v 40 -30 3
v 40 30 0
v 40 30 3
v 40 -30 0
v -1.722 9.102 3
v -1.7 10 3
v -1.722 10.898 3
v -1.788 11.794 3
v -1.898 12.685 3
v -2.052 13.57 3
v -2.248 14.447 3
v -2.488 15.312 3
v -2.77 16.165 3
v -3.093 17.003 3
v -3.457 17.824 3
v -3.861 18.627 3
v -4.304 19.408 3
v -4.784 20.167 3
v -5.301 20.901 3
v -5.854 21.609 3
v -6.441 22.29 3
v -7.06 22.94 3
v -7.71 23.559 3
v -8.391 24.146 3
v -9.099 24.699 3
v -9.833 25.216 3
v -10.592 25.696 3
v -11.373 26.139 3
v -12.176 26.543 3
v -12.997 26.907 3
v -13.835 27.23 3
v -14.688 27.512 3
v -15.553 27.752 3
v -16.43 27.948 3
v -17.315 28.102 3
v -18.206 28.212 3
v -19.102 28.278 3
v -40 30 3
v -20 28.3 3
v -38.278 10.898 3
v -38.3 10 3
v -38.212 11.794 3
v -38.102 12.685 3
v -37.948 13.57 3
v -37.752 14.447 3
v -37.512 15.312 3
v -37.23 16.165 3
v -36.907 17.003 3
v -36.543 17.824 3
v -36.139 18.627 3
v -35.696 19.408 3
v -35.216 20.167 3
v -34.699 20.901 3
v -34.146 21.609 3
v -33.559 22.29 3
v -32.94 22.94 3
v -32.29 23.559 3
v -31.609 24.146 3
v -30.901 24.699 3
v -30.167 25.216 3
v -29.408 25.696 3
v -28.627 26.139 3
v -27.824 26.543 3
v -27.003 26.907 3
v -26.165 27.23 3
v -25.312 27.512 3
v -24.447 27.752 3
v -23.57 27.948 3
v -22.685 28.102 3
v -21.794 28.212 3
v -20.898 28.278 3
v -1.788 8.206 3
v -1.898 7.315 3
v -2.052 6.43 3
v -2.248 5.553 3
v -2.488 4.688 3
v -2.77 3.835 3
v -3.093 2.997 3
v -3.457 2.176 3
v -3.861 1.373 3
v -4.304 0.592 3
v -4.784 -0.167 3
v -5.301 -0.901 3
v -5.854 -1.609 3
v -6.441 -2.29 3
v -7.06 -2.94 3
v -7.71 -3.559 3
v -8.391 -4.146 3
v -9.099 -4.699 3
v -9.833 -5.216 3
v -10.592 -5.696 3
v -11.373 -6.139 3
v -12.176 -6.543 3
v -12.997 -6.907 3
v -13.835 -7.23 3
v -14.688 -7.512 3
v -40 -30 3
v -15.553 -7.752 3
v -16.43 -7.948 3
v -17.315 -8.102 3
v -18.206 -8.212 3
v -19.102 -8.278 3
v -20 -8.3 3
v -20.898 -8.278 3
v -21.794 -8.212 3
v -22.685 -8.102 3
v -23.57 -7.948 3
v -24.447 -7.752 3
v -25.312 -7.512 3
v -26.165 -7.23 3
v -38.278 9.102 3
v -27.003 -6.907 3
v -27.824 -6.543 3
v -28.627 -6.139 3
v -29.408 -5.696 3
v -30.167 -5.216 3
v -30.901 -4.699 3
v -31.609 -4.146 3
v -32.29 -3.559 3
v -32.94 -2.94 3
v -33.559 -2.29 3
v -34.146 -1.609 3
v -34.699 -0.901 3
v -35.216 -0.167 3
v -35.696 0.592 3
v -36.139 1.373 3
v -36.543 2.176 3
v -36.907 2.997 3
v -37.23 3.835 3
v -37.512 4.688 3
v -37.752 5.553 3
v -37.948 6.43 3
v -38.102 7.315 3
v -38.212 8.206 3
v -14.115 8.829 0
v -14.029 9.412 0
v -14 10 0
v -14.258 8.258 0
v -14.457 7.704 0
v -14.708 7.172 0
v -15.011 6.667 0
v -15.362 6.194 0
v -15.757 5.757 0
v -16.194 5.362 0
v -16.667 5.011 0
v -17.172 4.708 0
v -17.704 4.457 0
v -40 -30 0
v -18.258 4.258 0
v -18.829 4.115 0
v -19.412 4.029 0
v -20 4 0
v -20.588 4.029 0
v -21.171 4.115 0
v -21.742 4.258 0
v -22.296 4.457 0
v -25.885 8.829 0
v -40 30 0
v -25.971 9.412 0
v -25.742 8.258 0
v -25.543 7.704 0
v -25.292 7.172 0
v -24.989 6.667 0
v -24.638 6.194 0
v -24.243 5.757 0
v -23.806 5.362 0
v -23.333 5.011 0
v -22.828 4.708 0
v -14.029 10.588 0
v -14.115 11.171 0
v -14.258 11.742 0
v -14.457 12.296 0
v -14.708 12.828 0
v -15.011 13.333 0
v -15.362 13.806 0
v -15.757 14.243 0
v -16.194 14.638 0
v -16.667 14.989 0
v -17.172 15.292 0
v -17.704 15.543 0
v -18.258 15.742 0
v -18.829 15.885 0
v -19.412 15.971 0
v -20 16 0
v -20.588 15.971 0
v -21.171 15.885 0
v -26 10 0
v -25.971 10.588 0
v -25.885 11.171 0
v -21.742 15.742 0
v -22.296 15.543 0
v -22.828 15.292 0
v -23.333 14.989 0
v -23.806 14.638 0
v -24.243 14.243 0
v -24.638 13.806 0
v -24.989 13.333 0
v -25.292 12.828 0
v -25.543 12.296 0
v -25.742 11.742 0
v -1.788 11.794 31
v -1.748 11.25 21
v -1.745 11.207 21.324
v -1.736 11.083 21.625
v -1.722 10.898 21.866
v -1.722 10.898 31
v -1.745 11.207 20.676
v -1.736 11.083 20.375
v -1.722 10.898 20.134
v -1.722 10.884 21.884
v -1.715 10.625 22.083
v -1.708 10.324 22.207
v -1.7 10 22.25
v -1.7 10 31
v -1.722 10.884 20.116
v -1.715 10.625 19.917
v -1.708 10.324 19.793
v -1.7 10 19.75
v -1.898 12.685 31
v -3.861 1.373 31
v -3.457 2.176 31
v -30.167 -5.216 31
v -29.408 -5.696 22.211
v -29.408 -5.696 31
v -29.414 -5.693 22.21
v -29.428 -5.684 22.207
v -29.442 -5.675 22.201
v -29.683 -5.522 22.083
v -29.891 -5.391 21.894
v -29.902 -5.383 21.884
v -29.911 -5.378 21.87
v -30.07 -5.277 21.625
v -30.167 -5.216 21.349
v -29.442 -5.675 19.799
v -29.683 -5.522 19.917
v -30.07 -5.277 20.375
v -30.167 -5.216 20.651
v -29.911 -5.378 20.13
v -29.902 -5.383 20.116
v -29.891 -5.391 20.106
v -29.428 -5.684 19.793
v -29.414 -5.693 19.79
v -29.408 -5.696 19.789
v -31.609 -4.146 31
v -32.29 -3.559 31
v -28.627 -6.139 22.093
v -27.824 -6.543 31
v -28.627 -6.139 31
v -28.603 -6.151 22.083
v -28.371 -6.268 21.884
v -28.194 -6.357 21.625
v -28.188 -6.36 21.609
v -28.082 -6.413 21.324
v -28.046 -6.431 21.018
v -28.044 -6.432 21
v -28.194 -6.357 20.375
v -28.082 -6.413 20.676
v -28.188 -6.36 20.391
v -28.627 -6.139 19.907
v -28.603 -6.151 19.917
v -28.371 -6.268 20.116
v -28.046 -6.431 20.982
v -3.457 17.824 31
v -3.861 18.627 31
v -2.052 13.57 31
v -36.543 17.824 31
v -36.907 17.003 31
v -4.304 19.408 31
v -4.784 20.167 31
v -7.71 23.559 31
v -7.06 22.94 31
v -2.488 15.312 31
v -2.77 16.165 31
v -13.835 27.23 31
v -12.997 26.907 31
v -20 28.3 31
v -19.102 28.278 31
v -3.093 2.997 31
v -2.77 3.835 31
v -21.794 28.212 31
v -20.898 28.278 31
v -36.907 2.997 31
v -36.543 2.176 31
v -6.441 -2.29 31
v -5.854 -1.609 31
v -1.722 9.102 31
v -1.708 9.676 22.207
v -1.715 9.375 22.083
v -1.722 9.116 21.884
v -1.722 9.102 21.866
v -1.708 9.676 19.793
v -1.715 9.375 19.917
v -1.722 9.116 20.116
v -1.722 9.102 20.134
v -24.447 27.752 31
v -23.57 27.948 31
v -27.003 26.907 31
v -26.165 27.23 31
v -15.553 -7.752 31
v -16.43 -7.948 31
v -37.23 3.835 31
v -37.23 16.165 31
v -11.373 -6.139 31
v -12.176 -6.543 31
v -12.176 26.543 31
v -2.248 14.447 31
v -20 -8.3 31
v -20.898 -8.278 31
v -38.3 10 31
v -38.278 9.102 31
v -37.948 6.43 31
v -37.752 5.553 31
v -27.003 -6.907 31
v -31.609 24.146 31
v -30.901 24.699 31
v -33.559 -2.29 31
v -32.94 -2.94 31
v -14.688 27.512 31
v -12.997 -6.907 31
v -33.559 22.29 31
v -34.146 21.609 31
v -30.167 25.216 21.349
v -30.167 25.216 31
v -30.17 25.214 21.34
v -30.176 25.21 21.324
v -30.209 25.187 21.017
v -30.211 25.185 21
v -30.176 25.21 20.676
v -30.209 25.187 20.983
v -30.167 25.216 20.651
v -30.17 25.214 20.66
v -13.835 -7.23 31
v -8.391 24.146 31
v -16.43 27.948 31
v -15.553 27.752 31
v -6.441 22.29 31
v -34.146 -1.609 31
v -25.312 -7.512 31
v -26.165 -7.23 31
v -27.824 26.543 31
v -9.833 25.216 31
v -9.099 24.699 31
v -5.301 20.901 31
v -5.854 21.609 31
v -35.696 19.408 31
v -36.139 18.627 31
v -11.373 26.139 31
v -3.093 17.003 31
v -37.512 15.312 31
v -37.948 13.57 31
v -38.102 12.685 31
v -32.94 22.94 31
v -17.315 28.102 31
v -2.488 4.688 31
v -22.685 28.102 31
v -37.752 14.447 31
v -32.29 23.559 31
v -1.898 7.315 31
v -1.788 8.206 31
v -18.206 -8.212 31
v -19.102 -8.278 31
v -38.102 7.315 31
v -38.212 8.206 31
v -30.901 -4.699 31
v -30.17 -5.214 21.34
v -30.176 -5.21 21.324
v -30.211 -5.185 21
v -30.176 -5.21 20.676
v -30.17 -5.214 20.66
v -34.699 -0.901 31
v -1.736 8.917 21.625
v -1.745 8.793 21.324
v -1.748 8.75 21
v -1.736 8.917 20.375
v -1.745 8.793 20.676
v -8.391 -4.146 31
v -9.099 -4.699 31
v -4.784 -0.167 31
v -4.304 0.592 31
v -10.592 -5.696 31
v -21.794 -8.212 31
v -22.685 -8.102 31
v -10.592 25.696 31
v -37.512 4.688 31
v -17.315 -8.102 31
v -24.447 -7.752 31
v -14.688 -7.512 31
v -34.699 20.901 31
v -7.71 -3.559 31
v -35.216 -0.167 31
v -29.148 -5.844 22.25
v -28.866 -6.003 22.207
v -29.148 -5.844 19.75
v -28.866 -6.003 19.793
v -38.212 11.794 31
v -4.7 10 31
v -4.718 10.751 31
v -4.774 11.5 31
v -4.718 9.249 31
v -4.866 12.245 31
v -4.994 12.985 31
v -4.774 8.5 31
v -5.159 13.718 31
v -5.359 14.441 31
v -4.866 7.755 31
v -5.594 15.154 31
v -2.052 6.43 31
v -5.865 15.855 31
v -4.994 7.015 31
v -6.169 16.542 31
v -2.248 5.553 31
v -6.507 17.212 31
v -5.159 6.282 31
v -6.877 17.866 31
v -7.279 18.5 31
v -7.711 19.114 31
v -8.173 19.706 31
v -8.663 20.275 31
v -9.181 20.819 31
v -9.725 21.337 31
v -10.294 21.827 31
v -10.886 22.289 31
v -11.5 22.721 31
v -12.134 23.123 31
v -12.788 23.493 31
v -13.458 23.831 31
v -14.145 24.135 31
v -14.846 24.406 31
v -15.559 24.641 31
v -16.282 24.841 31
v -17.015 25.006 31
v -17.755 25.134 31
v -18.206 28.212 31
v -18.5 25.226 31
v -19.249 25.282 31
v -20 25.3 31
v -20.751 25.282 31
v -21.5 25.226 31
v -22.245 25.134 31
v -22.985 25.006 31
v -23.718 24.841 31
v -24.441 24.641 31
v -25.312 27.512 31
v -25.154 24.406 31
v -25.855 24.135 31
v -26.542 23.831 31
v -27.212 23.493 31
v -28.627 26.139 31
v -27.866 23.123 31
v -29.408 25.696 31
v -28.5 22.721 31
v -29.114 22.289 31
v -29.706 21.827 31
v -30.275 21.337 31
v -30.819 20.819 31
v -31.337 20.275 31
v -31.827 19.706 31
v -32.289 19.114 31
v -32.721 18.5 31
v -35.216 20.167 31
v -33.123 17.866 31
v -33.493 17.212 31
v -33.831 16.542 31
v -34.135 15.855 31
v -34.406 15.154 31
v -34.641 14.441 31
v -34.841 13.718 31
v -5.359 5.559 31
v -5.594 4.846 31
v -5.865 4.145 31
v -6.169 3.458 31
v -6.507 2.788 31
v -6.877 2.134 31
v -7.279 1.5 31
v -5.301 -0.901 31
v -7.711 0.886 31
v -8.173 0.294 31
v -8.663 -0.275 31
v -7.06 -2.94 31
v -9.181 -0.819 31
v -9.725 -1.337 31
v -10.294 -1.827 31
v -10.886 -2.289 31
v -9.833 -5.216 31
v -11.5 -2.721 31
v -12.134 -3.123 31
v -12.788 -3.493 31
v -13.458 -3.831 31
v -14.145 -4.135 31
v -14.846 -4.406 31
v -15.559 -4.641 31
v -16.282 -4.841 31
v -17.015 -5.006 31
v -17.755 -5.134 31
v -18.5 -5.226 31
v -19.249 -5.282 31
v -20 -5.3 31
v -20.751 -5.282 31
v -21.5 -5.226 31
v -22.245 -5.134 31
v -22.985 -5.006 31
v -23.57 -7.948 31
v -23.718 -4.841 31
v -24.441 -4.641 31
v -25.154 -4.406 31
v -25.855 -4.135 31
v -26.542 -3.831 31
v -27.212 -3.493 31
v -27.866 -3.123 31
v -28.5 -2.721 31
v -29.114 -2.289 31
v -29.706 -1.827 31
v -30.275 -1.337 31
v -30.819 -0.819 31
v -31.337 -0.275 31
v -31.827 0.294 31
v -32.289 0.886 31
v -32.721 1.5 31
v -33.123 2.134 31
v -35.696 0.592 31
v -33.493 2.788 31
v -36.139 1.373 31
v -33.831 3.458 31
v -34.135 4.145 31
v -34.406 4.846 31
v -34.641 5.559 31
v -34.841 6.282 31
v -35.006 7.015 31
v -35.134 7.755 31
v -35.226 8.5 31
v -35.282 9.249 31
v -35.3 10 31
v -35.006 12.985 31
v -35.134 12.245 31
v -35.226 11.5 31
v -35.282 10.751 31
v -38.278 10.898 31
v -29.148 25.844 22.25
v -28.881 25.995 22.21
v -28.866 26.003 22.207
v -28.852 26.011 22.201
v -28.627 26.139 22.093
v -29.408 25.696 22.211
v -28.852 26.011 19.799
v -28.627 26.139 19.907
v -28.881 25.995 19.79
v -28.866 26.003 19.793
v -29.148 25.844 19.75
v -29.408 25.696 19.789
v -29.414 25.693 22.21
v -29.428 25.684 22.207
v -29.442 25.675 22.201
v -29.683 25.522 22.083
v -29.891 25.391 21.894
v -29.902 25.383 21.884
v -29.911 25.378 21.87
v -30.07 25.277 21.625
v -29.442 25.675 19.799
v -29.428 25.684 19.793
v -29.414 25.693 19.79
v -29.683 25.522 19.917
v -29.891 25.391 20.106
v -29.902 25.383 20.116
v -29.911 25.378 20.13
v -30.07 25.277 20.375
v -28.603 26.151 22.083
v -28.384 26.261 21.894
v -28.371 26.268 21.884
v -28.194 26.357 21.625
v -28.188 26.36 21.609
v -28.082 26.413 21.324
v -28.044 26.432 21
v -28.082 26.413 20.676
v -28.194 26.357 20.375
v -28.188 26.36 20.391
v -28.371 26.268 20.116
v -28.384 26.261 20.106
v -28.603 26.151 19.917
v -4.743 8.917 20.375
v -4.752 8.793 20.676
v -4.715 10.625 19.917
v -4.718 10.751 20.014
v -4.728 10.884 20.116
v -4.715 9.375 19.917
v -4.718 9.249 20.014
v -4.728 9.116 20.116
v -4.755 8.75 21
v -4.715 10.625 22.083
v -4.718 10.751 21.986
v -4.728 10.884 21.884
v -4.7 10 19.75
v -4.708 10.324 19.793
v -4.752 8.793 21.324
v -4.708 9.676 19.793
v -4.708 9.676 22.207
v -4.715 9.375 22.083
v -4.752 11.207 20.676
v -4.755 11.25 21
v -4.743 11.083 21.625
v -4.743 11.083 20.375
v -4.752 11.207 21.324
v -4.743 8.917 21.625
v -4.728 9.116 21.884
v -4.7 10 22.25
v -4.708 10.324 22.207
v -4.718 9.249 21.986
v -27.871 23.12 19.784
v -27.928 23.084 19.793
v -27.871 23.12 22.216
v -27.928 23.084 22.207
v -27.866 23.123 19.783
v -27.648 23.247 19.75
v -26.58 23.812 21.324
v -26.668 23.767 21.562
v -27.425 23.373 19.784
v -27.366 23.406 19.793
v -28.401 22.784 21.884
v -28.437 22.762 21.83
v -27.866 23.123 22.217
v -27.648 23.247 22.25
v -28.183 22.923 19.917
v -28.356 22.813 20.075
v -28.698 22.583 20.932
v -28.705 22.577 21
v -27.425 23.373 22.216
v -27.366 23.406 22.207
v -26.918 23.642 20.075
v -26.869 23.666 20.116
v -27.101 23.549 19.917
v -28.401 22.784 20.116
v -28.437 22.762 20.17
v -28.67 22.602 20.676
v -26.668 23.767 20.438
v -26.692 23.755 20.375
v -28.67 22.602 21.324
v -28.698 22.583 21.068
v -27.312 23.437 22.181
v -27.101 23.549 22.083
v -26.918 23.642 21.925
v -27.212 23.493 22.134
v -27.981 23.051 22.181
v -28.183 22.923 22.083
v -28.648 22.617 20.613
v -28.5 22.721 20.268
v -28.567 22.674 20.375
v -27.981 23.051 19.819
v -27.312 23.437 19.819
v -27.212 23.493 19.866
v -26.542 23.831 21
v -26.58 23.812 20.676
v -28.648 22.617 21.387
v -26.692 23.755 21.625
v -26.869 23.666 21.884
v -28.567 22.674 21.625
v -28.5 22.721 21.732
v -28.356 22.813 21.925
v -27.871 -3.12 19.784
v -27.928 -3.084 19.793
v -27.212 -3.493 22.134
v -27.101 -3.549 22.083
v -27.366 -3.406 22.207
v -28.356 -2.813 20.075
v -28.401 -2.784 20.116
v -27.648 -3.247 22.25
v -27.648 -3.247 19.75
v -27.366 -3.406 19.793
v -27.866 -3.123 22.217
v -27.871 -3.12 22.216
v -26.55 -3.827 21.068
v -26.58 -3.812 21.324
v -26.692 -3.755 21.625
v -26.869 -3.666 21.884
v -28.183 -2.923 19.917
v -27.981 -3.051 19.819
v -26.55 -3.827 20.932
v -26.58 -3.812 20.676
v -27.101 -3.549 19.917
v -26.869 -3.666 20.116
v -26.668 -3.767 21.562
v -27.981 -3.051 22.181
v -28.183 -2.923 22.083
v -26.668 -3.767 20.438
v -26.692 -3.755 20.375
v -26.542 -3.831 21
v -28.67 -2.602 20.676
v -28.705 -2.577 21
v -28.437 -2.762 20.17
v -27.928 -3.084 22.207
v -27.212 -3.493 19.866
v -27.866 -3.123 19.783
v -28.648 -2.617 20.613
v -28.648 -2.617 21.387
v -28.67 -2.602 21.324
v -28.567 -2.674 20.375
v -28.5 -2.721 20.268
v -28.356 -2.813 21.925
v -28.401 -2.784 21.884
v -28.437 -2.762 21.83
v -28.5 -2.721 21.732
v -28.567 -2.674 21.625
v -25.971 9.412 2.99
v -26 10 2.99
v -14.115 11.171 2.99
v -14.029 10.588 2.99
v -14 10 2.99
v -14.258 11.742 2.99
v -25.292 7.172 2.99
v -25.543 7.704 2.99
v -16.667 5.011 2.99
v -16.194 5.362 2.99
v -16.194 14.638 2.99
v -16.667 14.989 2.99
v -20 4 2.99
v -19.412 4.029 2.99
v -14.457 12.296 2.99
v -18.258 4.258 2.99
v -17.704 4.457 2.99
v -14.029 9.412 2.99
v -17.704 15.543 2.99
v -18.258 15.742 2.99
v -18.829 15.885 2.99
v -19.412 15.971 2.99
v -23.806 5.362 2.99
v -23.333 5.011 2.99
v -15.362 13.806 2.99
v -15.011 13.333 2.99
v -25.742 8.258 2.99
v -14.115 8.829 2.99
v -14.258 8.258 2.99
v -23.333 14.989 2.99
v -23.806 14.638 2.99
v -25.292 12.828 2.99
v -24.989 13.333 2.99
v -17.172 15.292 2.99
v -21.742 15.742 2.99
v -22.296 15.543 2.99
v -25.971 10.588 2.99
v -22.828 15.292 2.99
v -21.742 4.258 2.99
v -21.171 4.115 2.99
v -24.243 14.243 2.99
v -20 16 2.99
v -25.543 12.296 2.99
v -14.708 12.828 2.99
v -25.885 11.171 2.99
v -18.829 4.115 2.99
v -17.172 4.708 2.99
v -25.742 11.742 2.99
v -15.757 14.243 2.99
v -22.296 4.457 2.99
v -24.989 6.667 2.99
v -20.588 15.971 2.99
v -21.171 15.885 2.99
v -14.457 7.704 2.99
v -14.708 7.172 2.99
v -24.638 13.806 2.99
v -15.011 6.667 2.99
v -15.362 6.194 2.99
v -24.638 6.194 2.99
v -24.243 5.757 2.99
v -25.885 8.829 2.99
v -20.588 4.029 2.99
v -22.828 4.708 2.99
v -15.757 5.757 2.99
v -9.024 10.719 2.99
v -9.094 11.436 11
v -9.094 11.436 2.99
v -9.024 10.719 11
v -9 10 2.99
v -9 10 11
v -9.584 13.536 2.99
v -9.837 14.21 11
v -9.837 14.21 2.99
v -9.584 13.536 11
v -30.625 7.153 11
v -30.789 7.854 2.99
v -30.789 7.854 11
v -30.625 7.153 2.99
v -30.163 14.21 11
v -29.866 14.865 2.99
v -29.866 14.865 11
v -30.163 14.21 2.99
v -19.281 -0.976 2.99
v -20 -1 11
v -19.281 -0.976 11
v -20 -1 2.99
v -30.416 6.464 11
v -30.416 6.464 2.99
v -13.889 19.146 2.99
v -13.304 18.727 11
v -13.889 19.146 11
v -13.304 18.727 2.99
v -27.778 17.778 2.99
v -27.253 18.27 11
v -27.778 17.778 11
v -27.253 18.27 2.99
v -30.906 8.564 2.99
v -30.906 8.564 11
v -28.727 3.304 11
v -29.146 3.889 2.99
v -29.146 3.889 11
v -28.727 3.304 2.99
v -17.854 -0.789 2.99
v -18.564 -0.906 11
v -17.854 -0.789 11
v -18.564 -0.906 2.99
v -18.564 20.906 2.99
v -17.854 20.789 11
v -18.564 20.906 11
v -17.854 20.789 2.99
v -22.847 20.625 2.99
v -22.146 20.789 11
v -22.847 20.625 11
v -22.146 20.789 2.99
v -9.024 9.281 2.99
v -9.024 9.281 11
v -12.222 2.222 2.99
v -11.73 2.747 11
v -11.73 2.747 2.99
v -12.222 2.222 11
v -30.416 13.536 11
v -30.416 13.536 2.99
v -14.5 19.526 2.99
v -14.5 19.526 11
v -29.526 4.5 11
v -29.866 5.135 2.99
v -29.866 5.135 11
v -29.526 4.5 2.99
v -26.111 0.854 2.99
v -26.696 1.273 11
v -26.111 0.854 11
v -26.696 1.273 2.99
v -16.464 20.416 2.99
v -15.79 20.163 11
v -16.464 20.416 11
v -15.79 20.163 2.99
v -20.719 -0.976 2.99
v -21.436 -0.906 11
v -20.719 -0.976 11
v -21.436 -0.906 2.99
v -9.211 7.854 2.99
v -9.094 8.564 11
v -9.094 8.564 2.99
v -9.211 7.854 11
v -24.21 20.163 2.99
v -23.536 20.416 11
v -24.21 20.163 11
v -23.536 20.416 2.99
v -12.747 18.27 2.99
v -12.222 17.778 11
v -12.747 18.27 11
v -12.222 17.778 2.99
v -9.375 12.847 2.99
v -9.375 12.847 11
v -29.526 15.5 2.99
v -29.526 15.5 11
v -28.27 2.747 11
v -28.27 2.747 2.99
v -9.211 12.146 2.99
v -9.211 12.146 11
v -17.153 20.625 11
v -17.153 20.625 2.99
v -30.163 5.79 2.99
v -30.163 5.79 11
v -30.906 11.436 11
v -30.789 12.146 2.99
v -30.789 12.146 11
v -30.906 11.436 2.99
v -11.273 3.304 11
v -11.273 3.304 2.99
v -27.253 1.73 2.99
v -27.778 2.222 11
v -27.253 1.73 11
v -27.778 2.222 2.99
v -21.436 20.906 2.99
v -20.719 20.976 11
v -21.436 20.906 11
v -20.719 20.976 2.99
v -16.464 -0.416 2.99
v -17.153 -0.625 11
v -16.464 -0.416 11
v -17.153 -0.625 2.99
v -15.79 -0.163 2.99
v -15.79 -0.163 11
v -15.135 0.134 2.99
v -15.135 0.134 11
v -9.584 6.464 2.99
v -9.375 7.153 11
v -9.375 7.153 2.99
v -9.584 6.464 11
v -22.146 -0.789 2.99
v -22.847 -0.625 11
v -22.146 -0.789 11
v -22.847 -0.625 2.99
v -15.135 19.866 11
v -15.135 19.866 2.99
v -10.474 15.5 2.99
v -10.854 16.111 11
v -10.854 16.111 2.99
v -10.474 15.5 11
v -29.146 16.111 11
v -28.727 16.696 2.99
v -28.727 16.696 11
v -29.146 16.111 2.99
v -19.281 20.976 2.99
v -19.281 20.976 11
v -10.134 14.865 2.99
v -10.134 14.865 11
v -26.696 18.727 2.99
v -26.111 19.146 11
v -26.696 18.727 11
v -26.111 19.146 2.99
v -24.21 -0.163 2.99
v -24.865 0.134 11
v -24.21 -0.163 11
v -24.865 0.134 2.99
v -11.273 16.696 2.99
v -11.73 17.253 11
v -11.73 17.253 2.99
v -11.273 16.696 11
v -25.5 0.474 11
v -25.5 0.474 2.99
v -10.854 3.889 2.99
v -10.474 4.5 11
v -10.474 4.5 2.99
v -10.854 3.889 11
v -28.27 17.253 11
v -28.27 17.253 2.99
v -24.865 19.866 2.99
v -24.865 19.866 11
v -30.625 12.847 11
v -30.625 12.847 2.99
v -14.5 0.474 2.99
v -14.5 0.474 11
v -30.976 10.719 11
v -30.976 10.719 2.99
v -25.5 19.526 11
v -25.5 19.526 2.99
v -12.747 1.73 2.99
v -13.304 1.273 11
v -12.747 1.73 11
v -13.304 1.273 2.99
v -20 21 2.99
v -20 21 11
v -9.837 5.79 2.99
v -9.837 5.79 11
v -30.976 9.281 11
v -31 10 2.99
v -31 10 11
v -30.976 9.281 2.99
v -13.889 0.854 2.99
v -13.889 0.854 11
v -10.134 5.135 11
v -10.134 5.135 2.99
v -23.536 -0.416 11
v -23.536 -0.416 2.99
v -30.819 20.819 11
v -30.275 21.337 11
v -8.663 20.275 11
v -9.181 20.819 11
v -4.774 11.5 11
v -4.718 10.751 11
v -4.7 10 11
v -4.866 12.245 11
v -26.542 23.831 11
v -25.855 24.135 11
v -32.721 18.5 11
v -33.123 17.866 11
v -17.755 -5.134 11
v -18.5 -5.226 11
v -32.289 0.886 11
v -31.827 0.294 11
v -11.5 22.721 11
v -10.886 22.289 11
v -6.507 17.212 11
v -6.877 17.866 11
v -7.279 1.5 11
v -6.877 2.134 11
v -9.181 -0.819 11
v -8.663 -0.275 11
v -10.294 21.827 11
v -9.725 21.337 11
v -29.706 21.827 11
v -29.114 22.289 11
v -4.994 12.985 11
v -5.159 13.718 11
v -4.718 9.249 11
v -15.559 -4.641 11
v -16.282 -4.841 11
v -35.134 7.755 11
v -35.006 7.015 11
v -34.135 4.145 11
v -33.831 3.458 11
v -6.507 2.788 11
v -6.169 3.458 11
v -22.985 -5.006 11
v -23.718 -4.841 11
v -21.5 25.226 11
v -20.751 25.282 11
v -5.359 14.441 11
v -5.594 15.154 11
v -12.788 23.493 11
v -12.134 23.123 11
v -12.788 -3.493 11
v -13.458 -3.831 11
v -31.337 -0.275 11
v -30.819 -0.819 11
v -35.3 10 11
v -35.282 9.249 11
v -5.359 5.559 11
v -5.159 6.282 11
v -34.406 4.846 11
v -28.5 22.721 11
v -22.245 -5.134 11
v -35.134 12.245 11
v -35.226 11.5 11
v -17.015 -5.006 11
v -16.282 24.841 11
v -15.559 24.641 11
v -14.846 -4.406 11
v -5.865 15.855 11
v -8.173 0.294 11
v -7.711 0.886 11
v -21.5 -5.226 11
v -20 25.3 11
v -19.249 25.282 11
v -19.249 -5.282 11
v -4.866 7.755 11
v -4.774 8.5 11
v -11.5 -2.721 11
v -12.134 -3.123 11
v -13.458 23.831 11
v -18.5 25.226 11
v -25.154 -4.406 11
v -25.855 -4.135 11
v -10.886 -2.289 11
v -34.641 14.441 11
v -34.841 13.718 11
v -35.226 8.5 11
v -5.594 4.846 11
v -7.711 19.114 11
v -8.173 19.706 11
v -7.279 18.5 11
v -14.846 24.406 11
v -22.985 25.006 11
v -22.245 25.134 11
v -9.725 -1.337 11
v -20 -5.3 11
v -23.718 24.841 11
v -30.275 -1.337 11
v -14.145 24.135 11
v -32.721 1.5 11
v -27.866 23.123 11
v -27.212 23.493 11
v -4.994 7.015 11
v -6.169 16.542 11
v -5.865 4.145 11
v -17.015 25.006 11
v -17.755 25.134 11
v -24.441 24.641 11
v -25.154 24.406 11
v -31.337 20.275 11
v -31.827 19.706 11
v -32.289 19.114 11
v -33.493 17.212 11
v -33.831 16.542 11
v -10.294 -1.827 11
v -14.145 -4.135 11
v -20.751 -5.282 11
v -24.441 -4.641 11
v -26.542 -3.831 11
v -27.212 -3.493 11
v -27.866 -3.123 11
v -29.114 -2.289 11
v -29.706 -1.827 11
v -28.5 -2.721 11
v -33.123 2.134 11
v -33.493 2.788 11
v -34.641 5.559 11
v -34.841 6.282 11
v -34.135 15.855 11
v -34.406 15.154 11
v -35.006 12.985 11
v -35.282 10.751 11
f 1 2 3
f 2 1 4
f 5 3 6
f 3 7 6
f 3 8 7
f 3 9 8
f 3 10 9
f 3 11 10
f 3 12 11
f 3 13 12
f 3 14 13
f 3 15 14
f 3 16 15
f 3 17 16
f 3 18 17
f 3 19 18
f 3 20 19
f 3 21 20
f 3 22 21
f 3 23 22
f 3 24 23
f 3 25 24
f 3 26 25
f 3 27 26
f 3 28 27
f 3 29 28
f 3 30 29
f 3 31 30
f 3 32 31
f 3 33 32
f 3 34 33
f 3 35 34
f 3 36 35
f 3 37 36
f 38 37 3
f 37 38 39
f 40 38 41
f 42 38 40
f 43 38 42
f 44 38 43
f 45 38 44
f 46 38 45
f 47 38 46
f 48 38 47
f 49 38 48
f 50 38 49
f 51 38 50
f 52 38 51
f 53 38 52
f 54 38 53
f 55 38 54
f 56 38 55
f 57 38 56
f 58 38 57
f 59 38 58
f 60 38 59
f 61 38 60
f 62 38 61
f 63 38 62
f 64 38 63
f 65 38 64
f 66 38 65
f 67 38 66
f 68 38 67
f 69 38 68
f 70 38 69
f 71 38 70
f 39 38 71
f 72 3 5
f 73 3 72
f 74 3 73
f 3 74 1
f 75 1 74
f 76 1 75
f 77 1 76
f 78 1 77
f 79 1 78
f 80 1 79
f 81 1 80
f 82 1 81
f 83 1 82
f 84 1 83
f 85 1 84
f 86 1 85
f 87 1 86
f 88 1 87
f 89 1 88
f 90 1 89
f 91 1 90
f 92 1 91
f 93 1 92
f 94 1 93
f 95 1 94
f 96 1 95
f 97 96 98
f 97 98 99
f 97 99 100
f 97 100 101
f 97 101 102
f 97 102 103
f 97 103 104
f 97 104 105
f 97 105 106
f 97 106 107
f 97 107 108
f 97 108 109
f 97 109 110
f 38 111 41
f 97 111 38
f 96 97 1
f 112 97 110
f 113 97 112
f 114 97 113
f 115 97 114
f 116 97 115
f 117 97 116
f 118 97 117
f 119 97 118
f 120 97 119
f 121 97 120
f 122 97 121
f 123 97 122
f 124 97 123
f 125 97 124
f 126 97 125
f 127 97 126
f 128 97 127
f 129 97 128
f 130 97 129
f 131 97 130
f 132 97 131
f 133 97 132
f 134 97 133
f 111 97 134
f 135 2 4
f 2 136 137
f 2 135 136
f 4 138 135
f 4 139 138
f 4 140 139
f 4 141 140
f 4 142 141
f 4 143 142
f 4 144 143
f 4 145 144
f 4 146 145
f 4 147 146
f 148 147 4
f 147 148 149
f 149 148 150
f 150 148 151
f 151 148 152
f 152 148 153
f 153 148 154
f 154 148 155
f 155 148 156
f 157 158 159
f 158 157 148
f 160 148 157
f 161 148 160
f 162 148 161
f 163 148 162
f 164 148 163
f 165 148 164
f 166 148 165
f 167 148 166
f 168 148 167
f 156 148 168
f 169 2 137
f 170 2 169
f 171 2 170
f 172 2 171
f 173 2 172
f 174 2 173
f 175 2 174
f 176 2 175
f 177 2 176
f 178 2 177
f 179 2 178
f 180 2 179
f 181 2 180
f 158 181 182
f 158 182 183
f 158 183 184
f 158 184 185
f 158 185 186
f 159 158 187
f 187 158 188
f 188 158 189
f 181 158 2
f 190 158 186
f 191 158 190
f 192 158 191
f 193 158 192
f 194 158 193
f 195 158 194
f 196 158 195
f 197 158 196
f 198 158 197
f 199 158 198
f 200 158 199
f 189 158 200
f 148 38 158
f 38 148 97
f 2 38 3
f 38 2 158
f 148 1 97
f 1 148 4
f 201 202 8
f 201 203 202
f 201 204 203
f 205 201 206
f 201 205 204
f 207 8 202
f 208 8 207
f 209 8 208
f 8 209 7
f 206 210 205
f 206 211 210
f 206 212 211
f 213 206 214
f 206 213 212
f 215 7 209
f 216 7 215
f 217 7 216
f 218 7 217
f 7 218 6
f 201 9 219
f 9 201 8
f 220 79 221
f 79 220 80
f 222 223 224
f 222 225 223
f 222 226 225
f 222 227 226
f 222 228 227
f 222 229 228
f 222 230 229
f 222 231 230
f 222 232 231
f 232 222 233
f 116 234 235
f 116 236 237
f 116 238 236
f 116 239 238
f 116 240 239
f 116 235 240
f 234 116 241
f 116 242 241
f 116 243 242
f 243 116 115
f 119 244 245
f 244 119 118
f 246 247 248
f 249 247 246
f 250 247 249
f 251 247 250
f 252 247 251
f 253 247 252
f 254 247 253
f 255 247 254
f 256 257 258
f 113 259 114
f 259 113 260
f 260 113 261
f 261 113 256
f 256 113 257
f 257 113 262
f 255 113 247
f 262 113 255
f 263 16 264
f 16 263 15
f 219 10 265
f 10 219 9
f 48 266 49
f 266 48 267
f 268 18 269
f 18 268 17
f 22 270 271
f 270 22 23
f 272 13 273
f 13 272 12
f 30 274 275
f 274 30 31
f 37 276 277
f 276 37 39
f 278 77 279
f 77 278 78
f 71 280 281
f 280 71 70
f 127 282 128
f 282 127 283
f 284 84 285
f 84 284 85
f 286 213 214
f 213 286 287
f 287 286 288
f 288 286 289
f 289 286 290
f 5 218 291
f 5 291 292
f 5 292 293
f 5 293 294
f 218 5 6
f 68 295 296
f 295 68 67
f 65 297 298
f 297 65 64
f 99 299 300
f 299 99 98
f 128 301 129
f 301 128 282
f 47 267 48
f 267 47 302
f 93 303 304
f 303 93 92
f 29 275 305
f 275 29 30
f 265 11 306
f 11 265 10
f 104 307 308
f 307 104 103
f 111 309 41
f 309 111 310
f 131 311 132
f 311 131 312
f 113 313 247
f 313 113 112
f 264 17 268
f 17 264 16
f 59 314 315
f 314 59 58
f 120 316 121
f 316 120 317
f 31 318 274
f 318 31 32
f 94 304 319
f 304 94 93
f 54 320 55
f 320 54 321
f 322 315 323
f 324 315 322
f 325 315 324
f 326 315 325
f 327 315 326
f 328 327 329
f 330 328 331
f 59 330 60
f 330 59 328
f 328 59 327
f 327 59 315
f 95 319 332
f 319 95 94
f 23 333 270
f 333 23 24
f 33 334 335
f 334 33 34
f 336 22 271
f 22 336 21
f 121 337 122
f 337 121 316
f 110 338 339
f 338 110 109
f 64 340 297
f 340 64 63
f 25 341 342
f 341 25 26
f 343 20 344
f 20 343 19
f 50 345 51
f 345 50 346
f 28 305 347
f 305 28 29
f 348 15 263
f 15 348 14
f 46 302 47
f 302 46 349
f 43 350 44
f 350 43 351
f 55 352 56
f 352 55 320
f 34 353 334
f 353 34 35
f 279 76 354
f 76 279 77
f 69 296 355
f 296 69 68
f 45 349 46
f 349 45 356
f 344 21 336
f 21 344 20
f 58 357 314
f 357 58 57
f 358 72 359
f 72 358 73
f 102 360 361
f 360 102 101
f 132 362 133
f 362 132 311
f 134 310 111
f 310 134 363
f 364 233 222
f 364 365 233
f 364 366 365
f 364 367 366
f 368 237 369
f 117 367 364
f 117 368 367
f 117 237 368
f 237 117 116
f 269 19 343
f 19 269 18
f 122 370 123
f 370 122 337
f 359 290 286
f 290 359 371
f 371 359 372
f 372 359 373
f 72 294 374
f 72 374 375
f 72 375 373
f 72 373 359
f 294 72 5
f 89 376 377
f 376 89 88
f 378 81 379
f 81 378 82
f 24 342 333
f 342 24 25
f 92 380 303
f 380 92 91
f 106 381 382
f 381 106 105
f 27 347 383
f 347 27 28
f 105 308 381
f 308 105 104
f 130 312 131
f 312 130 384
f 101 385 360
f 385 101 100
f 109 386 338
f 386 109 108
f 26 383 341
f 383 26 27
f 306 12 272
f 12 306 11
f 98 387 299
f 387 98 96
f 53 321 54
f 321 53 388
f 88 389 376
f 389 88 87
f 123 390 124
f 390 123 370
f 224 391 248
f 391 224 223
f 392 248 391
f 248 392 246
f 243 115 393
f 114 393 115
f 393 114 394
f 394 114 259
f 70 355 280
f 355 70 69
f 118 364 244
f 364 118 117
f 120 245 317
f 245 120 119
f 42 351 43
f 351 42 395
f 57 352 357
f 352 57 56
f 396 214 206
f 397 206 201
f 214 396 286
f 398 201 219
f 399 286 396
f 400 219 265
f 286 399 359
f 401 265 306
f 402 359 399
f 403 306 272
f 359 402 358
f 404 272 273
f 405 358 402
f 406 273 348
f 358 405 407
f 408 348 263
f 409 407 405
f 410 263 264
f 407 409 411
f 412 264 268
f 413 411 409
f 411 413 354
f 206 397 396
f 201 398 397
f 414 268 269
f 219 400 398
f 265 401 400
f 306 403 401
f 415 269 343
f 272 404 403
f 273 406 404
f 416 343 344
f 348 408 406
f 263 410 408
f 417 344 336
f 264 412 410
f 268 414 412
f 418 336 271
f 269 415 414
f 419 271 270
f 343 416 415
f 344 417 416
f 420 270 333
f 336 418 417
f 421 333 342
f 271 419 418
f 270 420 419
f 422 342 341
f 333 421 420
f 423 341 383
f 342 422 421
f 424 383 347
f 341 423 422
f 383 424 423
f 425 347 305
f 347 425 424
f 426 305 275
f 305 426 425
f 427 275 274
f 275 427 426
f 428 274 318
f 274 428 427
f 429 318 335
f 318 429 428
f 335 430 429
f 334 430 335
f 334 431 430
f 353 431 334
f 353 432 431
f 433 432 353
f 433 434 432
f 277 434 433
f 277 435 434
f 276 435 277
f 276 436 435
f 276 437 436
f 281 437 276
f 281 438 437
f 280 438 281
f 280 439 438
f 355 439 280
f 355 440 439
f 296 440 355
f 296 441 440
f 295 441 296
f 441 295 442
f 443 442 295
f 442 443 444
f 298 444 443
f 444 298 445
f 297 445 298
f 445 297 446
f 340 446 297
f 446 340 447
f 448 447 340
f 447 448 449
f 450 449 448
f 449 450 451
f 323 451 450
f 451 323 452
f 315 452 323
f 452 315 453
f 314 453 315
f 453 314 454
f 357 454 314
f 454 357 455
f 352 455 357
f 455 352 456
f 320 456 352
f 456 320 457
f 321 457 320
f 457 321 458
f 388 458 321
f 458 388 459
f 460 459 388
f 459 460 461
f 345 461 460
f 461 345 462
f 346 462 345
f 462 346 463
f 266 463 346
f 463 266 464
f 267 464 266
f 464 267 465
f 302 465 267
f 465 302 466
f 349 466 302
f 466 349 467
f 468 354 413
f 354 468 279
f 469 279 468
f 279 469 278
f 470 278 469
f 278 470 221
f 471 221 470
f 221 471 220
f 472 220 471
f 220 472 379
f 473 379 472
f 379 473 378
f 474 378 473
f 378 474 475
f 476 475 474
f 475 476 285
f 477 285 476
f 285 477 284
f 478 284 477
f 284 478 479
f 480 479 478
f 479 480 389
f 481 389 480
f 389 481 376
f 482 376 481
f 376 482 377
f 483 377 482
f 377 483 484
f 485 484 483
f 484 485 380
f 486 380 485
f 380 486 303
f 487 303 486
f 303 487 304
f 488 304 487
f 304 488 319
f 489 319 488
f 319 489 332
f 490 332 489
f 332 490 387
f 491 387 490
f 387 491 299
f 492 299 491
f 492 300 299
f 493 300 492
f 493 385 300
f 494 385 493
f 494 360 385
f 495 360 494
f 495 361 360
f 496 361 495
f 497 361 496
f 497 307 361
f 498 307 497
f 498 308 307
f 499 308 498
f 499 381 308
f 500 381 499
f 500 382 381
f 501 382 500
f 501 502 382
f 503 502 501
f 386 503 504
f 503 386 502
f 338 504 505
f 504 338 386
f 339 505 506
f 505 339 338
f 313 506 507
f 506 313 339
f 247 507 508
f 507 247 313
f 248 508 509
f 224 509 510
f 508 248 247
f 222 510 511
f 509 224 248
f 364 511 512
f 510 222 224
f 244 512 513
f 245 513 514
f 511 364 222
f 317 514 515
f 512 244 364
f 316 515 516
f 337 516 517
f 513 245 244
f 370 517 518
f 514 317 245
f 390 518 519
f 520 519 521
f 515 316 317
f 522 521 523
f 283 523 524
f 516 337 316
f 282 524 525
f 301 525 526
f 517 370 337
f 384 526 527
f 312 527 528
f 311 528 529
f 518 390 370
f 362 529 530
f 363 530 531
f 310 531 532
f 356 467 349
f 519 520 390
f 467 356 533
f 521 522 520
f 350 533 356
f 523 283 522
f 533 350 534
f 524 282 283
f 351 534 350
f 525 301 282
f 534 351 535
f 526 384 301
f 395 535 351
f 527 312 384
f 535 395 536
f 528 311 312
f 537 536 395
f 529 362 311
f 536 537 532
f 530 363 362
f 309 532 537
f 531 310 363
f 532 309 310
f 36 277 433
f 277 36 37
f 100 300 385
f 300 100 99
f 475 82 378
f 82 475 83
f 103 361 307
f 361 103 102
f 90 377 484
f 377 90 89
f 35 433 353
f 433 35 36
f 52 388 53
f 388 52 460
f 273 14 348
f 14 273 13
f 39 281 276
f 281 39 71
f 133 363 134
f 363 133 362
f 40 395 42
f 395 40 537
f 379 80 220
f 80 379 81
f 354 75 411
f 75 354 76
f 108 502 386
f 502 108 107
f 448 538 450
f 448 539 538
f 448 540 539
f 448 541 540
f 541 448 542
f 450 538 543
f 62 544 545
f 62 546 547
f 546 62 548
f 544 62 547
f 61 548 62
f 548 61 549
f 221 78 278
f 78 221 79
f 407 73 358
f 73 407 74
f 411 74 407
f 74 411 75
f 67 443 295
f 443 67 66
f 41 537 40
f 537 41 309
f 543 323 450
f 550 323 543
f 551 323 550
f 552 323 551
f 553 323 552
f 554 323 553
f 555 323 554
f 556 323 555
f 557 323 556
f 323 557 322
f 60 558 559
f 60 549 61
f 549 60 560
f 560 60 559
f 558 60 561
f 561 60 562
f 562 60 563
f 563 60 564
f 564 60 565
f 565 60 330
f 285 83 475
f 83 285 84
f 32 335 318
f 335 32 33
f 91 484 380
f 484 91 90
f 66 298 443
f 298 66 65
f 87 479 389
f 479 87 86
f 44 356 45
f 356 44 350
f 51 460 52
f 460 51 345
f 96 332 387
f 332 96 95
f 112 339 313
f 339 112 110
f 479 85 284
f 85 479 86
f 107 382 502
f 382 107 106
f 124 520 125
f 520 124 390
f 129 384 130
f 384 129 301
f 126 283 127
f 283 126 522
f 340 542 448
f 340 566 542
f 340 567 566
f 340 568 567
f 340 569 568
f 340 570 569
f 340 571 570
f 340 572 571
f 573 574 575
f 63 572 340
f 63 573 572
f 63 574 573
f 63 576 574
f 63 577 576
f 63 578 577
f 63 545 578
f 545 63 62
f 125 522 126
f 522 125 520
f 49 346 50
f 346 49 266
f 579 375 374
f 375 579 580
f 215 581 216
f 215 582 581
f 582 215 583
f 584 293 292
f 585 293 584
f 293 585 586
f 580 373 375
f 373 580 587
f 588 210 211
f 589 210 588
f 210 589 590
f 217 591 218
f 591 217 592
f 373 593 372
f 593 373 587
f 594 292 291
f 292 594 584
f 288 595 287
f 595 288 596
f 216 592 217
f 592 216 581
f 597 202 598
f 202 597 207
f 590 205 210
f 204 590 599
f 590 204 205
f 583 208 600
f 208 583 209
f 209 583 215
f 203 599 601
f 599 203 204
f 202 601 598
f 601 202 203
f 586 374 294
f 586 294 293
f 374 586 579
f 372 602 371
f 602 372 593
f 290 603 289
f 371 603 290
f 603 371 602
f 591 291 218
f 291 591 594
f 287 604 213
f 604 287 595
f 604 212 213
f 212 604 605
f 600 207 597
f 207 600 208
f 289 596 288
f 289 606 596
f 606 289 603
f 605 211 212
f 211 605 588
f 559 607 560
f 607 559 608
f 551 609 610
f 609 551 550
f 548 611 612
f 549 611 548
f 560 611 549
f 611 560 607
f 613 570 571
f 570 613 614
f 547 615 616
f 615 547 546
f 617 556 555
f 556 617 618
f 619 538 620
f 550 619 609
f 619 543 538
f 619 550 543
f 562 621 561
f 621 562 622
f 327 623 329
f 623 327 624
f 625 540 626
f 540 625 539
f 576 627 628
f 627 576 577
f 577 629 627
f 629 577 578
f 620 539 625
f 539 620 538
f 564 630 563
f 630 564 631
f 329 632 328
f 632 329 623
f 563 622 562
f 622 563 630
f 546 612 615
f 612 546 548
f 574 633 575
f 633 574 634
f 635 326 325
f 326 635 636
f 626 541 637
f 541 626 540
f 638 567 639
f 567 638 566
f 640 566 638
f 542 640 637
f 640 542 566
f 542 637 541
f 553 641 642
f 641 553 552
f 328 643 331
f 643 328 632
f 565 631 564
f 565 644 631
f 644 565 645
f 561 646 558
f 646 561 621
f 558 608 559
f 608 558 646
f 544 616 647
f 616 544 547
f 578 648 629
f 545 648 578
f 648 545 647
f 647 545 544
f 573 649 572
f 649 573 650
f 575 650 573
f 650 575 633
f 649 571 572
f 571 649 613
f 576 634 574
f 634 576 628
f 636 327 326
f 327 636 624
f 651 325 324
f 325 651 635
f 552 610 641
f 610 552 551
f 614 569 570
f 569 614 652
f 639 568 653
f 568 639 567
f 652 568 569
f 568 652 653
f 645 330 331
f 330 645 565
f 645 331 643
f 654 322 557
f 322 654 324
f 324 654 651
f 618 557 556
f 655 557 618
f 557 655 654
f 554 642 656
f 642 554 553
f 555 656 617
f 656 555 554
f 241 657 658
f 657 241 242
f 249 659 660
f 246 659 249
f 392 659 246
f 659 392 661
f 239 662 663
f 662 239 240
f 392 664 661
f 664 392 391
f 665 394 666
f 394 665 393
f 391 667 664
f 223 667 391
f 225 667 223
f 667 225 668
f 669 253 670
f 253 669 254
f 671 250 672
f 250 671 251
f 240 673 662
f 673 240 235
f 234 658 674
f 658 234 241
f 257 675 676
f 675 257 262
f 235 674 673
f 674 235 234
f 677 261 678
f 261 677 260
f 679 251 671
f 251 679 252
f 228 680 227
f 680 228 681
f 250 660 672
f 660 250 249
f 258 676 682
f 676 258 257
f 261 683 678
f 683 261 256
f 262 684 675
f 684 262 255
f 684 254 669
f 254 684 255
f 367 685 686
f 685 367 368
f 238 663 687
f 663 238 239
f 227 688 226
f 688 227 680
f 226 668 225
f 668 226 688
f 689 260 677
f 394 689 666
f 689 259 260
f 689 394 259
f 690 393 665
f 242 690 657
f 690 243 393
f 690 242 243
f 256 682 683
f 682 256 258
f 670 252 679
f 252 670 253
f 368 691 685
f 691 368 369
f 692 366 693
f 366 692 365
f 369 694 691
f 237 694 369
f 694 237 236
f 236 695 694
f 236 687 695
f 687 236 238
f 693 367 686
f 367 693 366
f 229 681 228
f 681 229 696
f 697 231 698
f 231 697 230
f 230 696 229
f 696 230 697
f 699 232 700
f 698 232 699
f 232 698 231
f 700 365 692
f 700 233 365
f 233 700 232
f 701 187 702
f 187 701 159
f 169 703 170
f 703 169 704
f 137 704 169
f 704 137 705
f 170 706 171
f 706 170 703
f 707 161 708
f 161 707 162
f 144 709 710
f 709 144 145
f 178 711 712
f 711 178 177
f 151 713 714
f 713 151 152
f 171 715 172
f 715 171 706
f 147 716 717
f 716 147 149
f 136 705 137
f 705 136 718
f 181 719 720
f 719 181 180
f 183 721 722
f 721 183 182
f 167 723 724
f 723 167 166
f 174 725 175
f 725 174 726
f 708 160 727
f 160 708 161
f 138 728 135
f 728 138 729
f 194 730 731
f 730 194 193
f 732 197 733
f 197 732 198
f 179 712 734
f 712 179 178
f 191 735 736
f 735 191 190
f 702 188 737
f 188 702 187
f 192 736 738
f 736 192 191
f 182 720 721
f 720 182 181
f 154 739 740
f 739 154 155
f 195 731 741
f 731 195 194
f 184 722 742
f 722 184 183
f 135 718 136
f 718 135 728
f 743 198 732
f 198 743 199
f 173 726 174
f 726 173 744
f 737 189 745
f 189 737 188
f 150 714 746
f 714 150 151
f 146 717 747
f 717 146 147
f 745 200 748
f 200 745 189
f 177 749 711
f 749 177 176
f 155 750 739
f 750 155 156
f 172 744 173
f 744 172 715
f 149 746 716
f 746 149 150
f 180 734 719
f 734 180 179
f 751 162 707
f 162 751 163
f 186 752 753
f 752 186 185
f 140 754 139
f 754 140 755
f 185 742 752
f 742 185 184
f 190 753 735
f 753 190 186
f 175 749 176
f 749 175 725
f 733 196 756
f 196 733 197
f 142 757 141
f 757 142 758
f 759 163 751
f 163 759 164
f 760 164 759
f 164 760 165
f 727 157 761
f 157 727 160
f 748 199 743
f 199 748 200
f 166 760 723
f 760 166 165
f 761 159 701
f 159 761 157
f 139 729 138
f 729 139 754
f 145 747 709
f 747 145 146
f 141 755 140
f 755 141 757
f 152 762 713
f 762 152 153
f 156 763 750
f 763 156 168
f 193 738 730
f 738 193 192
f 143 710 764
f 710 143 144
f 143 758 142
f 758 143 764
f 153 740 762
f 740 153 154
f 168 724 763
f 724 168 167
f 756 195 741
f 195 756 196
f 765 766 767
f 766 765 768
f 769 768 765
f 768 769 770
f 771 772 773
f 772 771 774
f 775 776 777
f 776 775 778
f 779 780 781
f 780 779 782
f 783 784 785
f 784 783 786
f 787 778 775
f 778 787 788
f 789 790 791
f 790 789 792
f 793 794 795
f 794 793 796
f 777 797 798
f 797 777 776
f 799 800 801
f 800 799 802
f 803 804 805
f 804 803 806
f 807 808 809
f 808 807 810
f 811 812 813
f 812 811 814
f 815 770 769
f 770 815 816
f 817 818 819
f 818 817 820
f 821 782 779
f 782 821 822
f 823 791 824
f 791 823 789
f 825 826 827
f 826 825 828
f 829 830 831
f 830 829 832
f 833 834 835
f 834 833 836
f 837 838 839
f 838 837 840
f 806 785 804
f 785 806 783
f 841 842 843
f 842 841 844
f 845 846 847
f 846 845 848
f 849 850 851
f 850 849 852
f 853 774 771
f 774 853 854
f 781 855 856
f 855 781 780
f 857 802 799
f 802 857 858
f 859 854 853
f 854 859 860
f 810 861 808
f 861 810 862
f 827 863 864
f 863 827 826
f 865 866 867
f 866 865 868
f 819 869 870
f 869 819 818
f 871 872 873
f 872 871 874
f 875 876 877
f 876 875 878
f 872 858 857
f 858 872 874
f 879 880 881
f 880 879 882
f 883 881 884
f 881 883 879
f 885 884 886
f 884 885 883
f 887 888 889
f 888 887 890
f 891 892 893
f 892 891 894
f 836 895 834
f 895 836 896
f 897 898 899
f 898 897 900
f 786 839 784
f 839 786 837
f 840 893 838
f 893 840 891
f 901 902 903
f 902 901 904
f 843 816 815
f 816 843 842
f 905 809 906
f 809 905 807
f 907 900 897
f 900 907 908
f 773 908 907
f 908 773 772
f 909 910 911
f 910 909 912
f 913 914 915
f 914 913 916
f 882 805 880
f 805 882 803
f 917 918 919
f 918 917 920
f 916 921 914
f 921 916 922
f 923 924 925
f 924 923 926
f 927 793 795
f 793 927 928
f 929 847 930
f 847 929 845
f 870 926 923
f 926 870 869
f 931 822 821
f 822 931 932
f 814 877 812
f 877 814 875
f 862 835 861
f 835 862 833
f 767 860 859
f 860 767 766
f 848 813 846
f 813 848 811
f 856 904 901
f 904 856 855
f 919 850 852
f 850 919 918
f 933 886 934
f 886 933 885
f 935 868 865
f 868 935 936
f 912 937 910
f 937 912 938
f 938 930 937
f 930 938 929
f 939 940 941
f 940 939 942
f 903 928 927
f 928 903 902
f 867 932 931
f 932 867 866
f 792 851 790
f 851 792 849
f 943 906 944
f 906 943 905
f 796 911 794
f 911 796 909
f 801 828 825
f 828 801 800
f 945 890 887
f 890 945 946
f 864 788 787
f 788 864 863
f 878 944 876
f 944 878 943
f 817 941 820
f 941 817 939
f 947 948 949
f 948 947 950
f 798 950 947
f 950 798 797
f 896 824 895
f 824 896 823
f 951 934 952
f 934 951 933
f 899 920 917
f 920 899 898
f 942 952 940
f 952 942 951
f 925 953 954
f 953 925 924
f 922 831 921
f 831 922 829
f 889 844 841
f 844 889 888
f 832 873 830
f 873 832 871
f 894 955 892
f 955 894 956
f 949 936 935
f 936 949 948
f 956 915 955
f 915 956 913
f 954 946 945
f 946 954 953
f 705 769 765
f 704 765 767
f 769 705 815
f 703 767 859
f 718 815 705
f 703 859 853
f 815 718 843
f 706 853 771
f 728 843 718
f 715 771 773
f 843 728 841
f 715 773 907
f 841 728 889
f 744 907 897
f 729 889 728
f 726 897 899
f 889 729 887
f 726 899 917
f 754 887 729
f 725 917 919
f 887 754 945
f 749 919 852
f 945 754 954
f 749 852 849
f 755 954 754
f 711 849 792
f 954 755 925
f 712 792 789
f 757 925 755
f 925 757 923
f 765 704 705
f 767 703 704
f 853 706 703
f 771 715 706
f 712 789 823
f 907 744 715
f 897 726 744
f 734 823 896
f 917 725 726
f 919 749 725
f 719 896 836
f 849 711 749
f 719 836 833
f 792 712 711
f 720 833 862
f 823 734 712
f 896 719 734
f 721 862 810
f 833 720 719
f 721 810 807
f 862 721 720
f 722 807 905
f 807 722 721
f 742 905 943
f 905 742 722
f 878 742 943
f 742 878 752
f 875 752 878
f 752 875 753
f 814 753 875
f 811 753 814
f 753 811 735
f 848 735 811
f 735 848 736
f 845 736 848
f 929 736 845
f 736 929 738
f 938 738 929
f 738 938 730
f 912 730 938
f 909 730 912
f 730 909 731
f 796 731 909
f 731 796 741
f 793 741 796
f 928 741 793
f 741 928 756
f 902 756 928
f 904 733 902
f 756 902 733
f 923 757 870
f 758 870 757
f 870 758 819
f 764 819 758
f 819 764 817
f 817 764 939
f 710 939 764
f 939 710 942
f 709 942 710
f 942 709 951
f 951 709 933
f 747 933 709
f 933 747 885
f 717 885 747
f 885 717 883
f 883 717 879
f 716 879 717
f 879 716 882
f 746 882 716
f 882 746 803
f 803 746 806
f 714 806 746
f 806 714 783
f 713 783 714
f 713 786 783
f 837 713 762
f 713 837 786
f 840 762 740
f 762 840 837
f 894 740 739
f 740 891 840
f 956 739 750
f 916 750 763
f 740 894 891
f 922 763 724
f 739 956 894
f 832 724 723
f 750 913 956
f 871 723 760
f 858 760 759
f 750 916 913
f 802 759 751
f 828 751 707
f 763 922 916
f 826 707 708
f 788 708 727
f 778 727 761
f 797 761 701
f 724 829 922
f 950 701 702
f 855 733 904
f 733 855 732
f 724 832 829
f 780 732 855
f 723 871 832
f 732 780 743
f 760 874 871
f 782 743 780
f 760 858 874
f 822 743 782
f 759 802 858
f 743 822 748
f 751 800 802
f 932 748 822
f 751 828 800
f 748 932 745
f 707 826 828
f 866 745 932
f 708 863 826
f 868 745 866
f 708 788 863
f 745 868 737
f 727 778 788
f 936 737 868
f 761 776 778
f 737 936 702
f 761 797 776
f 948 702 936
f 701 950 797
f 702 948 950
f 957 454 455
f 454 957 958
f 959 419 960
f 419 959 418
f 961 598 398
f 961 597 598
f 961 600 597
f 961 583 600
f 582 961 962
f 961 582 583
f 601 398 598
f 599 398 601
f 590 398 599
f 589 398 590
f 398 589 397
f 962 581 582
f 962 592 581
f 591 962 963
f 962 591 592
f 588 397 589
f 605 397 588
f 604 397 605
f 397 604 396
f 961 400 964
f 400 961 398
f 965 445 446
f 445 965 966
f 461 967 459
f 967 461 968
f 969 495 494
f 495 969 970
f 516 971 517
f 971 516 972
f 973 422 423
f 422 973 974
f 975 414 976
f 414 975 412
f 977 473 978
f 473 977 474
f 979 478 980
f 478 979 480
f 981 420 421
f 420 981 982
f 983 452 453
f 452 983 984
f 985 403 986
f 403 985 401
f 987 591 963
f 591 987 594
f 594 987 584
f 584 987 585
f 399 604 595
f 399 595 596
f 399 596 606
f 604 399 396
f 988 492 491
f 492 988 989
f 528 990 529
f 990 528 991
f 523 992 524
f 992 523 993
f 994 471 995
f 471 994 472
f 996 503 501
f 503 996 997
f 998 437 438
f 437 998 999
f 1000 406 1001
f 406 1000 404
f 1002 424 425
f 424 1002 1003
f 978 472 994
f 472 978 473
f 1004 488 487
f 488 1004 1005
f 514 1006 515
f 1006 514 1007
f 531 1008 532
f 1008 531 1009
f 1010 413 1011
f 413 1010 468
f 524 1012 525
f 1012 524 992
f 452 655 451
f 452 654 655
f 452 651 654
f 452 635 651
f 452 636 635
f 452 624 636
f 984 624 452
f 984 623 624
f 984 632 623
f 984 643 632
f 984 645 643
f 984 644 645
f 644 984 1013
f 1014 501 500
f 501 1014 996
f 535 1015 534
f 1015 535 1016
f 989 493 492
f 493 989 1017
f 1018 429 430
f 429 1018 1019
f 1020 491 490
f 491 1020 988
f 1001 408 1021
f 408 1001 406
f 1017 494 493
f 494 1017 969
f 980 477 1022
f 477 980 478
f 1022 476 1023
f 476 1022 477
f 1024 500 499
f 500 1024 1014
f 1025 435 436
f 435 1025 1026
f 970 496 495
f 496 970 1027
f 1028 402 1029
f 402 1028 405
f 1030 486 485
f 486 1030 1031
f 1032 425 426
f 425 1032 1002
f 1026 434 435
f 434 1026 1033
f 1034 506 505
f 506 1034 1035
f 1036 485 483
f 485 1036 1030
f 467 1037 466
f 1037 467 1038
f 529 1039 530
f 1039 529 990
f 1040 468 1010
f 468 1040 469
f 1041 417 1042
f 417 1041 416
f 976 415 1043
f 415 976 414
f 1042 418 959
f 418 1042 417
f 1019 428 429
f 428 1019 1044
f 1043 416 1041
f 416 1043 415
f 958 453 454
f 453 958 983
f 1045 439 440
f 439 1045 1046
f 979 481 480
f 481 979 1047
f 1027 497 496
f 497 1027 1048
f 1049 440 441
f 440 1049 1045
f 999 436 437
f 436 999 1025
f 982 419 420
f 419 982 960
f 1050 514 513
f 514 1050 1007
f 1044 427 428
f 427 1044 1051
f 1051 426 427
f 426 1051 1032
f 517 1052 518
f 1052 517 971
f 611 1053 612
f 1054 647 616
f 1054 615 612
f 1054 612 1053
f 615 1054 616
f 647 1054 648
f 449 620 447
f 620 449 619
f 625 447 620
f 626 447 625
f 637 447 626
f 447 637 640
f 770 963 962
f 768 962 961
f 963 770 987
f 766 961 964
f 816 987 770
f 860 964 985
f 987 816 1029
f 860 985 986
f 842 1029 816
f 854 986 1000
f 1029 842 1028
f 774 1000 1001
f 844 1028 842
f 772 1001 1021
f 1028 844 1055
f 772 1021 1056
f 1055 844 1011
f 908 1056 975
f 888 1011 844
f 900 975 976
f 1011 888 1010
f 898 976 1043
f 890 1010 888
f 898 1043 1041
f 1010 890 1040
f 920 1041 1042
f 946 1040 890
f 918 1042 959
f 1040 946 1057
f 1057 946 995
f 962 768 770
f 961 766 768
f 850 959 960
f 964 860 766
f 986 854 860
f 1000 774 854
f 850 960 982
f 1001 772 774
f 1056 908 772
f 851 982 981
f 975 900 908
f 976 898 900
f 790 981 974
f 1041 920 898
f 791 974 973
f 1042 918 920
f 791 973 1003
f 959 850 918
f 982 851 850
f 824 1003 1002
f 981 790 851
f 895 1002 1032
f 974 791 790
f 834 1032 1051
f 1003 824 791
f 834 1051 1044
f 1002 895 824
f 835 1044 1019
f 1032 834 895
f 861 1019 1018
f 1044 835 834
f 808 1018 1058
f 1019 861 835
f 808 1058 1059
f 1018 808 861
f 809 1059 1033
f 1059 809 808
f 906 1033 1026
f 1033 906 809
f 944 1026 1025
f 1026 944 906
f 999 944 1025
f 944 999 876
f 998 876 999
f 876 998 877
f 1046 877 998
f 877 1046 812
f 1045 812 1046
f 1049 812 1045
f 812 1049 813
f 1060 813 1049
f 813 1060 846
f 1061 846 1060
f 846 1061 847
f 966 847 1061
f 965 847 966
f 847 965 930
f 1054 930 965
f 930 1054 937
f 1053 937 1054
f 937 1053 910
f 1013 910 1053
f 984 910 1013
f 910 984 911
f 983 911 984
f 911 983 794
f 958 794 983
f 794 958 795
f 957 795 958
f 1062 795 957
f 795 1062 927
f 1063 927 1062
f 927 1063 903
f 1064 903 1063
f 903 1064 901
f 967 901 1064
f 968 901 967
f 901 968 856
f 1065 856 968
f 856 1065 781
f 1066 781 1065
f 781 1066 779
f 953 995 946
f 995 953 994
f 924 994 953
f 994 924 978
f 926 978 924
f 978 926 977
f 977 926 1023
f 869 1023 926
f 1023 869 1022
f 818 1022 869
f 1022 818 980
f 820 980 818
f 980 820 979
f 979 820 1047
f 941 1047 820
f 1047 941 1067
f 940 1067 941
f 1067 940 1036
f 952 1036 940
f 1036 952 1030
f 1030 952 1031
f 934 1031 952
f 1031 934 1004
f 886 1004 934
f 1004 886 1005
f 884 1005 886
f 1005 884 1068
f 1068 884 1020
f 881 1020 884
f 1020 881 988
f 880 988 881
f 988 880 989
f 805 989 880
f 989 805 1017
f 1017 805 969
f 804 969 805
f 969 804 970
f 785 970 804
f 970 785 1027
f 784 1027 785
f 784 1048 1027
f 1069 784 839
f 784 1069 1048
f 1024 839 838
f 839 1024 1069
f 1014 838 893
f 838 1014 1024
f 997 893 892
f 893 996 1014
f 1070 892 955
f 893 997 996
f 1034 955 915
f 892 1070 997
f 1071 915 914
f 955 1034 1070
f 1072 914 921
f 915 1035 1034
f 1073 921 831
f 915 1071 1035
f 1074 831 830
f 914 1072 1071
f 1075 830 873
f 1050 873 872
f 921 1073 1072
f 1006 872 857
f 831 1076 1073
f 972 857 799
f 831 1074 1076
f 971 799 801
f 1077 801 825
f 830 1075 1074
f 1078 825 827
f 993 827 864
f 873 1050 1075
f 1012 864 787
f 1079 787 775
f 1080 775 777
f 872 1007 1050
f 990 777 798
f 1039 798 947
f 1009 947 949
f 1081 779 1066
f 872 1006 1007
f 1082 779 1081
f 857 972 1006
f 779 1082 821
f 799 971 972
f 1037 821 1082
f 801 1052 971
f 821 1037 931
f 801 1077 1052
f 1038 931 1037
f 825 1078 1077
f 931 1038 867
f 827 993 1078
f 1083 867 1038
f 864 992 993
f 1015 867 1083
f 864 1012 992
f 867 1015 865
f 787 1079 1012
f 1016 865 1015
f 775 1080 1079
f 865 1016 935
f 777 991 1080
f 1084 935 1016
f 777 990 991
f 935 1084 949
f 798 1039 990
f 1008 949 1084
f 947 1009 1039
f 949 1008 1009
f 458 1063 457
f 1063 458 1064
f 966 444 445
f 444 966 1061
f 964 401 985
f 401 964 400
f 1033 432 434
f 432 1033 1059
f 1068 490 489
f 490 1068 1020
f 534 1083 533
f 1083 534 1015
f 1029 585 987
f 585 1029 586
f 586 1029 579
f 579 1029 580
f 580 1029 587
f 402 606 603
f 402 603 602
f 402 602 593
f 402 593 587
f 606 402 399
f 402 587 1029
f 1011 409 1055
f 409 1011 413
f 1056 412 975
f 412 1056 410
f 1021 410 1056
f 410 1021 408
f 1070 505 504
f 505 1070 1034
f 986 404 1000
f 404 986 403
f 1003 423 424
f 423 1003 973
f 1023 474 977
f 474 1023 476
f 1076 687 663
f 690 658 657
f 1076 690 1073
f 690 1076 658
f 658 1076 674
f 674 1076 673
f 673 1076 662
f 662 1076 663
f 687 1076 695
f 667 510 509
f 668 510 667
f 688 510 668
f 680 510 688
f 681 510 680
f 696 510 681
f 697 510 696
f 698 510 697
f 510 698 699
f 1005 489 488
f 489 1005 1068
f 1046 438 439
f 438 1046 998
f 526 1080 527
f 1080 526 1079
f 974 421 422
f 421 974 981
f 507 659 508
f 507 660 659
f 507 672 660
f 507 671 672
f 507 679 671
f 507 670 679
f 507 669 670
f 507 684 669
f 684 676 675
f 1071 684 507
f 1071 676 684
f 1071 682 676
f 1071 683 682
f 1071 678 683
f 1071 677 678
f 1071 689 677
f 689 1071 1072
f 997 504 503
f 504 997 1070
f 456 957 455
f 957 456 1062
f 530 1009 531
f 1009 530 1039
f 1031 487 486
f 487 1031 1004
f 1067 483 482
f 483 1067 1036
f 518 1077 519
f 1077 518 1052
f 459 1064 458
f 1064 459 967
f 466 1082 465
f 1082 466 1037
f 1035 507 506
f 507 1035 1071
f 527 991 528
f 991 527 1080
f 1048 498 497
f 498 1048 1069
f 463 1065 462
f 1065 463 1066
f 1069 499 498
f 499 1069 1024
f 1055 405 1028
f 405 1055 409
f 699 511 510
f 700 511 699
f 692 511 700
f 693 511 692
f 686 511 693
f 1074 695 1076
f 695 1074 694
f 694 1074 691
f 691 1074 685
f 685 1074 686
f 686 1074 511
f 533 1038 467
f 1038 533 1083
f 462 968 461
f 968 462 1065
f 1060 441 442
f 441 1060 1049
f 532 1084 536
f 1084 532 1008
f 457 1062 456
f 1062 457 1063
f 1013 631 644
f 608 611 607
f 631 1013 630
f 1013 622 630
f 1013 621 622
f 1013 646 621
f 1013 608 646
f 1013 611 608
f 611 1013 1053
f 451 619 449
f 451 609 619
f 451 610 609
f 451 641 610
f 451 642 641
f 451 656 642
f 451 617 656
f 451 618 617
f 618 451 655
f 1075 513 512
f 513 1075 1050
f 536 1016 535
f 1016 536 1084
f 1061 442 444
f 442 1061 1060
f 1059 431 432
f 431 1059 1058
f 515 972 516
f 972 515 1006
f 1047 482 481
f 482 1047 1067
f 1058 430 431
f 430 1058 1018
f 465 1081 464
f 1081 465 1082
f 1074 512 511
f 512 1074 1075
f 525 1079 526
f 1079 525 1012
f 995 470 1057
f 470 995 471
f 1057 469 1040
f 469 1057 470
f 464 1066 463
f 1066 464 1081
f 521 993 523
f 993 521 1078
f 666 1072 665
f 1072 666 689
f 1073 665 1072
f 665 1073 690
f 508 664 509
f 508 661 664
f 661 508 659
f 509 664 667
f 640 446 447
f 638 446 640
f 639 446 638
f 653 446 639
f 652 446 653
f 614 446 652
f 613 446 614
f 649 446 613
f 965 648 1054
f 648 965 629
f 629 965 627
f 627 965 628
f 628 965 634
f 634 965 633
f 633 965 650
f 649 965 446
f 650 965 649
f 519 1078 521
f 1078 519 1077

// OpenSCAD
// Phone adapter for a microscope eyepiece with a 30 mm outer diameter
// Category: hardware. A phone plate with an off-centre camera hole and, on the same axis, a sleeve
// that slides over the eyepiece. The sleeve bore steps down to 22 mm near the plate (a stop that
// fixes the camera-to-eyepiece distance); three radial M3 holes take centring screws.
// Print: PLA or PETG, phone side (plate) on the bed, 0.2 mm layers; tap the 2.5 mm holes for M3
// nylon screws. Hold the phone on the plate with rubber bands.
// SPDX-License-Identifier: CERN-OHL-P-2.0

/* [Adapter] */
plate = [80, 60, 3];      // X, Y, thickness [mm], centred on the origin
cam = [-20, 10];          // camera-hole axis
cam_d = 12;
sleeve_od = 36.6;
stop_d = 22;              // bore from z = 3 to 11
stop_top = 11;
bore_d = 30.6;            // bore from z = 11 to the top (30 mm eyepiece + clearance)
sleeve_top = 31;
screw_d = 2.5;            // M3 tapping holes
screw_z = 21;
screw_angles = [0, 120, 240];  // first one points in +X

/* [Hidden] */
eps = 0.01;

difference() {
    union() {
        translate([-plate.x / 2, -plate.y / 2, 0]) cube(plate);
        translate([cam.x, cam.y, plate.z - eps]) cylinder(d = sleeve_od, h = sleeve_top - plate.z + eps, $fn = 128);
    }
    translate([cam.x, cam.y, -1]) cylinder(d = cam_d, h = plate.z + 2, $fn = 64);
    translate([cam.x, cam.y, plate.z - eps]) cylinder(d = stop_d, h = stop_top - plate.z + 2 * eps, $fn = 96);
    translate([cam.x, cam.y, stop_top]) cylinder(d = bore_d, h = sleeve_top - stop_top + 1, $fn = 128);
    for (a = screw_angles)
        translate([cam.x, cam.y, screw_z]) rotate([0, 0, a]) rotate([0, 90, 0])
            cylinder(d = screw_d, h = sleeve_od / 2 + 1, $fn = 24);
}
